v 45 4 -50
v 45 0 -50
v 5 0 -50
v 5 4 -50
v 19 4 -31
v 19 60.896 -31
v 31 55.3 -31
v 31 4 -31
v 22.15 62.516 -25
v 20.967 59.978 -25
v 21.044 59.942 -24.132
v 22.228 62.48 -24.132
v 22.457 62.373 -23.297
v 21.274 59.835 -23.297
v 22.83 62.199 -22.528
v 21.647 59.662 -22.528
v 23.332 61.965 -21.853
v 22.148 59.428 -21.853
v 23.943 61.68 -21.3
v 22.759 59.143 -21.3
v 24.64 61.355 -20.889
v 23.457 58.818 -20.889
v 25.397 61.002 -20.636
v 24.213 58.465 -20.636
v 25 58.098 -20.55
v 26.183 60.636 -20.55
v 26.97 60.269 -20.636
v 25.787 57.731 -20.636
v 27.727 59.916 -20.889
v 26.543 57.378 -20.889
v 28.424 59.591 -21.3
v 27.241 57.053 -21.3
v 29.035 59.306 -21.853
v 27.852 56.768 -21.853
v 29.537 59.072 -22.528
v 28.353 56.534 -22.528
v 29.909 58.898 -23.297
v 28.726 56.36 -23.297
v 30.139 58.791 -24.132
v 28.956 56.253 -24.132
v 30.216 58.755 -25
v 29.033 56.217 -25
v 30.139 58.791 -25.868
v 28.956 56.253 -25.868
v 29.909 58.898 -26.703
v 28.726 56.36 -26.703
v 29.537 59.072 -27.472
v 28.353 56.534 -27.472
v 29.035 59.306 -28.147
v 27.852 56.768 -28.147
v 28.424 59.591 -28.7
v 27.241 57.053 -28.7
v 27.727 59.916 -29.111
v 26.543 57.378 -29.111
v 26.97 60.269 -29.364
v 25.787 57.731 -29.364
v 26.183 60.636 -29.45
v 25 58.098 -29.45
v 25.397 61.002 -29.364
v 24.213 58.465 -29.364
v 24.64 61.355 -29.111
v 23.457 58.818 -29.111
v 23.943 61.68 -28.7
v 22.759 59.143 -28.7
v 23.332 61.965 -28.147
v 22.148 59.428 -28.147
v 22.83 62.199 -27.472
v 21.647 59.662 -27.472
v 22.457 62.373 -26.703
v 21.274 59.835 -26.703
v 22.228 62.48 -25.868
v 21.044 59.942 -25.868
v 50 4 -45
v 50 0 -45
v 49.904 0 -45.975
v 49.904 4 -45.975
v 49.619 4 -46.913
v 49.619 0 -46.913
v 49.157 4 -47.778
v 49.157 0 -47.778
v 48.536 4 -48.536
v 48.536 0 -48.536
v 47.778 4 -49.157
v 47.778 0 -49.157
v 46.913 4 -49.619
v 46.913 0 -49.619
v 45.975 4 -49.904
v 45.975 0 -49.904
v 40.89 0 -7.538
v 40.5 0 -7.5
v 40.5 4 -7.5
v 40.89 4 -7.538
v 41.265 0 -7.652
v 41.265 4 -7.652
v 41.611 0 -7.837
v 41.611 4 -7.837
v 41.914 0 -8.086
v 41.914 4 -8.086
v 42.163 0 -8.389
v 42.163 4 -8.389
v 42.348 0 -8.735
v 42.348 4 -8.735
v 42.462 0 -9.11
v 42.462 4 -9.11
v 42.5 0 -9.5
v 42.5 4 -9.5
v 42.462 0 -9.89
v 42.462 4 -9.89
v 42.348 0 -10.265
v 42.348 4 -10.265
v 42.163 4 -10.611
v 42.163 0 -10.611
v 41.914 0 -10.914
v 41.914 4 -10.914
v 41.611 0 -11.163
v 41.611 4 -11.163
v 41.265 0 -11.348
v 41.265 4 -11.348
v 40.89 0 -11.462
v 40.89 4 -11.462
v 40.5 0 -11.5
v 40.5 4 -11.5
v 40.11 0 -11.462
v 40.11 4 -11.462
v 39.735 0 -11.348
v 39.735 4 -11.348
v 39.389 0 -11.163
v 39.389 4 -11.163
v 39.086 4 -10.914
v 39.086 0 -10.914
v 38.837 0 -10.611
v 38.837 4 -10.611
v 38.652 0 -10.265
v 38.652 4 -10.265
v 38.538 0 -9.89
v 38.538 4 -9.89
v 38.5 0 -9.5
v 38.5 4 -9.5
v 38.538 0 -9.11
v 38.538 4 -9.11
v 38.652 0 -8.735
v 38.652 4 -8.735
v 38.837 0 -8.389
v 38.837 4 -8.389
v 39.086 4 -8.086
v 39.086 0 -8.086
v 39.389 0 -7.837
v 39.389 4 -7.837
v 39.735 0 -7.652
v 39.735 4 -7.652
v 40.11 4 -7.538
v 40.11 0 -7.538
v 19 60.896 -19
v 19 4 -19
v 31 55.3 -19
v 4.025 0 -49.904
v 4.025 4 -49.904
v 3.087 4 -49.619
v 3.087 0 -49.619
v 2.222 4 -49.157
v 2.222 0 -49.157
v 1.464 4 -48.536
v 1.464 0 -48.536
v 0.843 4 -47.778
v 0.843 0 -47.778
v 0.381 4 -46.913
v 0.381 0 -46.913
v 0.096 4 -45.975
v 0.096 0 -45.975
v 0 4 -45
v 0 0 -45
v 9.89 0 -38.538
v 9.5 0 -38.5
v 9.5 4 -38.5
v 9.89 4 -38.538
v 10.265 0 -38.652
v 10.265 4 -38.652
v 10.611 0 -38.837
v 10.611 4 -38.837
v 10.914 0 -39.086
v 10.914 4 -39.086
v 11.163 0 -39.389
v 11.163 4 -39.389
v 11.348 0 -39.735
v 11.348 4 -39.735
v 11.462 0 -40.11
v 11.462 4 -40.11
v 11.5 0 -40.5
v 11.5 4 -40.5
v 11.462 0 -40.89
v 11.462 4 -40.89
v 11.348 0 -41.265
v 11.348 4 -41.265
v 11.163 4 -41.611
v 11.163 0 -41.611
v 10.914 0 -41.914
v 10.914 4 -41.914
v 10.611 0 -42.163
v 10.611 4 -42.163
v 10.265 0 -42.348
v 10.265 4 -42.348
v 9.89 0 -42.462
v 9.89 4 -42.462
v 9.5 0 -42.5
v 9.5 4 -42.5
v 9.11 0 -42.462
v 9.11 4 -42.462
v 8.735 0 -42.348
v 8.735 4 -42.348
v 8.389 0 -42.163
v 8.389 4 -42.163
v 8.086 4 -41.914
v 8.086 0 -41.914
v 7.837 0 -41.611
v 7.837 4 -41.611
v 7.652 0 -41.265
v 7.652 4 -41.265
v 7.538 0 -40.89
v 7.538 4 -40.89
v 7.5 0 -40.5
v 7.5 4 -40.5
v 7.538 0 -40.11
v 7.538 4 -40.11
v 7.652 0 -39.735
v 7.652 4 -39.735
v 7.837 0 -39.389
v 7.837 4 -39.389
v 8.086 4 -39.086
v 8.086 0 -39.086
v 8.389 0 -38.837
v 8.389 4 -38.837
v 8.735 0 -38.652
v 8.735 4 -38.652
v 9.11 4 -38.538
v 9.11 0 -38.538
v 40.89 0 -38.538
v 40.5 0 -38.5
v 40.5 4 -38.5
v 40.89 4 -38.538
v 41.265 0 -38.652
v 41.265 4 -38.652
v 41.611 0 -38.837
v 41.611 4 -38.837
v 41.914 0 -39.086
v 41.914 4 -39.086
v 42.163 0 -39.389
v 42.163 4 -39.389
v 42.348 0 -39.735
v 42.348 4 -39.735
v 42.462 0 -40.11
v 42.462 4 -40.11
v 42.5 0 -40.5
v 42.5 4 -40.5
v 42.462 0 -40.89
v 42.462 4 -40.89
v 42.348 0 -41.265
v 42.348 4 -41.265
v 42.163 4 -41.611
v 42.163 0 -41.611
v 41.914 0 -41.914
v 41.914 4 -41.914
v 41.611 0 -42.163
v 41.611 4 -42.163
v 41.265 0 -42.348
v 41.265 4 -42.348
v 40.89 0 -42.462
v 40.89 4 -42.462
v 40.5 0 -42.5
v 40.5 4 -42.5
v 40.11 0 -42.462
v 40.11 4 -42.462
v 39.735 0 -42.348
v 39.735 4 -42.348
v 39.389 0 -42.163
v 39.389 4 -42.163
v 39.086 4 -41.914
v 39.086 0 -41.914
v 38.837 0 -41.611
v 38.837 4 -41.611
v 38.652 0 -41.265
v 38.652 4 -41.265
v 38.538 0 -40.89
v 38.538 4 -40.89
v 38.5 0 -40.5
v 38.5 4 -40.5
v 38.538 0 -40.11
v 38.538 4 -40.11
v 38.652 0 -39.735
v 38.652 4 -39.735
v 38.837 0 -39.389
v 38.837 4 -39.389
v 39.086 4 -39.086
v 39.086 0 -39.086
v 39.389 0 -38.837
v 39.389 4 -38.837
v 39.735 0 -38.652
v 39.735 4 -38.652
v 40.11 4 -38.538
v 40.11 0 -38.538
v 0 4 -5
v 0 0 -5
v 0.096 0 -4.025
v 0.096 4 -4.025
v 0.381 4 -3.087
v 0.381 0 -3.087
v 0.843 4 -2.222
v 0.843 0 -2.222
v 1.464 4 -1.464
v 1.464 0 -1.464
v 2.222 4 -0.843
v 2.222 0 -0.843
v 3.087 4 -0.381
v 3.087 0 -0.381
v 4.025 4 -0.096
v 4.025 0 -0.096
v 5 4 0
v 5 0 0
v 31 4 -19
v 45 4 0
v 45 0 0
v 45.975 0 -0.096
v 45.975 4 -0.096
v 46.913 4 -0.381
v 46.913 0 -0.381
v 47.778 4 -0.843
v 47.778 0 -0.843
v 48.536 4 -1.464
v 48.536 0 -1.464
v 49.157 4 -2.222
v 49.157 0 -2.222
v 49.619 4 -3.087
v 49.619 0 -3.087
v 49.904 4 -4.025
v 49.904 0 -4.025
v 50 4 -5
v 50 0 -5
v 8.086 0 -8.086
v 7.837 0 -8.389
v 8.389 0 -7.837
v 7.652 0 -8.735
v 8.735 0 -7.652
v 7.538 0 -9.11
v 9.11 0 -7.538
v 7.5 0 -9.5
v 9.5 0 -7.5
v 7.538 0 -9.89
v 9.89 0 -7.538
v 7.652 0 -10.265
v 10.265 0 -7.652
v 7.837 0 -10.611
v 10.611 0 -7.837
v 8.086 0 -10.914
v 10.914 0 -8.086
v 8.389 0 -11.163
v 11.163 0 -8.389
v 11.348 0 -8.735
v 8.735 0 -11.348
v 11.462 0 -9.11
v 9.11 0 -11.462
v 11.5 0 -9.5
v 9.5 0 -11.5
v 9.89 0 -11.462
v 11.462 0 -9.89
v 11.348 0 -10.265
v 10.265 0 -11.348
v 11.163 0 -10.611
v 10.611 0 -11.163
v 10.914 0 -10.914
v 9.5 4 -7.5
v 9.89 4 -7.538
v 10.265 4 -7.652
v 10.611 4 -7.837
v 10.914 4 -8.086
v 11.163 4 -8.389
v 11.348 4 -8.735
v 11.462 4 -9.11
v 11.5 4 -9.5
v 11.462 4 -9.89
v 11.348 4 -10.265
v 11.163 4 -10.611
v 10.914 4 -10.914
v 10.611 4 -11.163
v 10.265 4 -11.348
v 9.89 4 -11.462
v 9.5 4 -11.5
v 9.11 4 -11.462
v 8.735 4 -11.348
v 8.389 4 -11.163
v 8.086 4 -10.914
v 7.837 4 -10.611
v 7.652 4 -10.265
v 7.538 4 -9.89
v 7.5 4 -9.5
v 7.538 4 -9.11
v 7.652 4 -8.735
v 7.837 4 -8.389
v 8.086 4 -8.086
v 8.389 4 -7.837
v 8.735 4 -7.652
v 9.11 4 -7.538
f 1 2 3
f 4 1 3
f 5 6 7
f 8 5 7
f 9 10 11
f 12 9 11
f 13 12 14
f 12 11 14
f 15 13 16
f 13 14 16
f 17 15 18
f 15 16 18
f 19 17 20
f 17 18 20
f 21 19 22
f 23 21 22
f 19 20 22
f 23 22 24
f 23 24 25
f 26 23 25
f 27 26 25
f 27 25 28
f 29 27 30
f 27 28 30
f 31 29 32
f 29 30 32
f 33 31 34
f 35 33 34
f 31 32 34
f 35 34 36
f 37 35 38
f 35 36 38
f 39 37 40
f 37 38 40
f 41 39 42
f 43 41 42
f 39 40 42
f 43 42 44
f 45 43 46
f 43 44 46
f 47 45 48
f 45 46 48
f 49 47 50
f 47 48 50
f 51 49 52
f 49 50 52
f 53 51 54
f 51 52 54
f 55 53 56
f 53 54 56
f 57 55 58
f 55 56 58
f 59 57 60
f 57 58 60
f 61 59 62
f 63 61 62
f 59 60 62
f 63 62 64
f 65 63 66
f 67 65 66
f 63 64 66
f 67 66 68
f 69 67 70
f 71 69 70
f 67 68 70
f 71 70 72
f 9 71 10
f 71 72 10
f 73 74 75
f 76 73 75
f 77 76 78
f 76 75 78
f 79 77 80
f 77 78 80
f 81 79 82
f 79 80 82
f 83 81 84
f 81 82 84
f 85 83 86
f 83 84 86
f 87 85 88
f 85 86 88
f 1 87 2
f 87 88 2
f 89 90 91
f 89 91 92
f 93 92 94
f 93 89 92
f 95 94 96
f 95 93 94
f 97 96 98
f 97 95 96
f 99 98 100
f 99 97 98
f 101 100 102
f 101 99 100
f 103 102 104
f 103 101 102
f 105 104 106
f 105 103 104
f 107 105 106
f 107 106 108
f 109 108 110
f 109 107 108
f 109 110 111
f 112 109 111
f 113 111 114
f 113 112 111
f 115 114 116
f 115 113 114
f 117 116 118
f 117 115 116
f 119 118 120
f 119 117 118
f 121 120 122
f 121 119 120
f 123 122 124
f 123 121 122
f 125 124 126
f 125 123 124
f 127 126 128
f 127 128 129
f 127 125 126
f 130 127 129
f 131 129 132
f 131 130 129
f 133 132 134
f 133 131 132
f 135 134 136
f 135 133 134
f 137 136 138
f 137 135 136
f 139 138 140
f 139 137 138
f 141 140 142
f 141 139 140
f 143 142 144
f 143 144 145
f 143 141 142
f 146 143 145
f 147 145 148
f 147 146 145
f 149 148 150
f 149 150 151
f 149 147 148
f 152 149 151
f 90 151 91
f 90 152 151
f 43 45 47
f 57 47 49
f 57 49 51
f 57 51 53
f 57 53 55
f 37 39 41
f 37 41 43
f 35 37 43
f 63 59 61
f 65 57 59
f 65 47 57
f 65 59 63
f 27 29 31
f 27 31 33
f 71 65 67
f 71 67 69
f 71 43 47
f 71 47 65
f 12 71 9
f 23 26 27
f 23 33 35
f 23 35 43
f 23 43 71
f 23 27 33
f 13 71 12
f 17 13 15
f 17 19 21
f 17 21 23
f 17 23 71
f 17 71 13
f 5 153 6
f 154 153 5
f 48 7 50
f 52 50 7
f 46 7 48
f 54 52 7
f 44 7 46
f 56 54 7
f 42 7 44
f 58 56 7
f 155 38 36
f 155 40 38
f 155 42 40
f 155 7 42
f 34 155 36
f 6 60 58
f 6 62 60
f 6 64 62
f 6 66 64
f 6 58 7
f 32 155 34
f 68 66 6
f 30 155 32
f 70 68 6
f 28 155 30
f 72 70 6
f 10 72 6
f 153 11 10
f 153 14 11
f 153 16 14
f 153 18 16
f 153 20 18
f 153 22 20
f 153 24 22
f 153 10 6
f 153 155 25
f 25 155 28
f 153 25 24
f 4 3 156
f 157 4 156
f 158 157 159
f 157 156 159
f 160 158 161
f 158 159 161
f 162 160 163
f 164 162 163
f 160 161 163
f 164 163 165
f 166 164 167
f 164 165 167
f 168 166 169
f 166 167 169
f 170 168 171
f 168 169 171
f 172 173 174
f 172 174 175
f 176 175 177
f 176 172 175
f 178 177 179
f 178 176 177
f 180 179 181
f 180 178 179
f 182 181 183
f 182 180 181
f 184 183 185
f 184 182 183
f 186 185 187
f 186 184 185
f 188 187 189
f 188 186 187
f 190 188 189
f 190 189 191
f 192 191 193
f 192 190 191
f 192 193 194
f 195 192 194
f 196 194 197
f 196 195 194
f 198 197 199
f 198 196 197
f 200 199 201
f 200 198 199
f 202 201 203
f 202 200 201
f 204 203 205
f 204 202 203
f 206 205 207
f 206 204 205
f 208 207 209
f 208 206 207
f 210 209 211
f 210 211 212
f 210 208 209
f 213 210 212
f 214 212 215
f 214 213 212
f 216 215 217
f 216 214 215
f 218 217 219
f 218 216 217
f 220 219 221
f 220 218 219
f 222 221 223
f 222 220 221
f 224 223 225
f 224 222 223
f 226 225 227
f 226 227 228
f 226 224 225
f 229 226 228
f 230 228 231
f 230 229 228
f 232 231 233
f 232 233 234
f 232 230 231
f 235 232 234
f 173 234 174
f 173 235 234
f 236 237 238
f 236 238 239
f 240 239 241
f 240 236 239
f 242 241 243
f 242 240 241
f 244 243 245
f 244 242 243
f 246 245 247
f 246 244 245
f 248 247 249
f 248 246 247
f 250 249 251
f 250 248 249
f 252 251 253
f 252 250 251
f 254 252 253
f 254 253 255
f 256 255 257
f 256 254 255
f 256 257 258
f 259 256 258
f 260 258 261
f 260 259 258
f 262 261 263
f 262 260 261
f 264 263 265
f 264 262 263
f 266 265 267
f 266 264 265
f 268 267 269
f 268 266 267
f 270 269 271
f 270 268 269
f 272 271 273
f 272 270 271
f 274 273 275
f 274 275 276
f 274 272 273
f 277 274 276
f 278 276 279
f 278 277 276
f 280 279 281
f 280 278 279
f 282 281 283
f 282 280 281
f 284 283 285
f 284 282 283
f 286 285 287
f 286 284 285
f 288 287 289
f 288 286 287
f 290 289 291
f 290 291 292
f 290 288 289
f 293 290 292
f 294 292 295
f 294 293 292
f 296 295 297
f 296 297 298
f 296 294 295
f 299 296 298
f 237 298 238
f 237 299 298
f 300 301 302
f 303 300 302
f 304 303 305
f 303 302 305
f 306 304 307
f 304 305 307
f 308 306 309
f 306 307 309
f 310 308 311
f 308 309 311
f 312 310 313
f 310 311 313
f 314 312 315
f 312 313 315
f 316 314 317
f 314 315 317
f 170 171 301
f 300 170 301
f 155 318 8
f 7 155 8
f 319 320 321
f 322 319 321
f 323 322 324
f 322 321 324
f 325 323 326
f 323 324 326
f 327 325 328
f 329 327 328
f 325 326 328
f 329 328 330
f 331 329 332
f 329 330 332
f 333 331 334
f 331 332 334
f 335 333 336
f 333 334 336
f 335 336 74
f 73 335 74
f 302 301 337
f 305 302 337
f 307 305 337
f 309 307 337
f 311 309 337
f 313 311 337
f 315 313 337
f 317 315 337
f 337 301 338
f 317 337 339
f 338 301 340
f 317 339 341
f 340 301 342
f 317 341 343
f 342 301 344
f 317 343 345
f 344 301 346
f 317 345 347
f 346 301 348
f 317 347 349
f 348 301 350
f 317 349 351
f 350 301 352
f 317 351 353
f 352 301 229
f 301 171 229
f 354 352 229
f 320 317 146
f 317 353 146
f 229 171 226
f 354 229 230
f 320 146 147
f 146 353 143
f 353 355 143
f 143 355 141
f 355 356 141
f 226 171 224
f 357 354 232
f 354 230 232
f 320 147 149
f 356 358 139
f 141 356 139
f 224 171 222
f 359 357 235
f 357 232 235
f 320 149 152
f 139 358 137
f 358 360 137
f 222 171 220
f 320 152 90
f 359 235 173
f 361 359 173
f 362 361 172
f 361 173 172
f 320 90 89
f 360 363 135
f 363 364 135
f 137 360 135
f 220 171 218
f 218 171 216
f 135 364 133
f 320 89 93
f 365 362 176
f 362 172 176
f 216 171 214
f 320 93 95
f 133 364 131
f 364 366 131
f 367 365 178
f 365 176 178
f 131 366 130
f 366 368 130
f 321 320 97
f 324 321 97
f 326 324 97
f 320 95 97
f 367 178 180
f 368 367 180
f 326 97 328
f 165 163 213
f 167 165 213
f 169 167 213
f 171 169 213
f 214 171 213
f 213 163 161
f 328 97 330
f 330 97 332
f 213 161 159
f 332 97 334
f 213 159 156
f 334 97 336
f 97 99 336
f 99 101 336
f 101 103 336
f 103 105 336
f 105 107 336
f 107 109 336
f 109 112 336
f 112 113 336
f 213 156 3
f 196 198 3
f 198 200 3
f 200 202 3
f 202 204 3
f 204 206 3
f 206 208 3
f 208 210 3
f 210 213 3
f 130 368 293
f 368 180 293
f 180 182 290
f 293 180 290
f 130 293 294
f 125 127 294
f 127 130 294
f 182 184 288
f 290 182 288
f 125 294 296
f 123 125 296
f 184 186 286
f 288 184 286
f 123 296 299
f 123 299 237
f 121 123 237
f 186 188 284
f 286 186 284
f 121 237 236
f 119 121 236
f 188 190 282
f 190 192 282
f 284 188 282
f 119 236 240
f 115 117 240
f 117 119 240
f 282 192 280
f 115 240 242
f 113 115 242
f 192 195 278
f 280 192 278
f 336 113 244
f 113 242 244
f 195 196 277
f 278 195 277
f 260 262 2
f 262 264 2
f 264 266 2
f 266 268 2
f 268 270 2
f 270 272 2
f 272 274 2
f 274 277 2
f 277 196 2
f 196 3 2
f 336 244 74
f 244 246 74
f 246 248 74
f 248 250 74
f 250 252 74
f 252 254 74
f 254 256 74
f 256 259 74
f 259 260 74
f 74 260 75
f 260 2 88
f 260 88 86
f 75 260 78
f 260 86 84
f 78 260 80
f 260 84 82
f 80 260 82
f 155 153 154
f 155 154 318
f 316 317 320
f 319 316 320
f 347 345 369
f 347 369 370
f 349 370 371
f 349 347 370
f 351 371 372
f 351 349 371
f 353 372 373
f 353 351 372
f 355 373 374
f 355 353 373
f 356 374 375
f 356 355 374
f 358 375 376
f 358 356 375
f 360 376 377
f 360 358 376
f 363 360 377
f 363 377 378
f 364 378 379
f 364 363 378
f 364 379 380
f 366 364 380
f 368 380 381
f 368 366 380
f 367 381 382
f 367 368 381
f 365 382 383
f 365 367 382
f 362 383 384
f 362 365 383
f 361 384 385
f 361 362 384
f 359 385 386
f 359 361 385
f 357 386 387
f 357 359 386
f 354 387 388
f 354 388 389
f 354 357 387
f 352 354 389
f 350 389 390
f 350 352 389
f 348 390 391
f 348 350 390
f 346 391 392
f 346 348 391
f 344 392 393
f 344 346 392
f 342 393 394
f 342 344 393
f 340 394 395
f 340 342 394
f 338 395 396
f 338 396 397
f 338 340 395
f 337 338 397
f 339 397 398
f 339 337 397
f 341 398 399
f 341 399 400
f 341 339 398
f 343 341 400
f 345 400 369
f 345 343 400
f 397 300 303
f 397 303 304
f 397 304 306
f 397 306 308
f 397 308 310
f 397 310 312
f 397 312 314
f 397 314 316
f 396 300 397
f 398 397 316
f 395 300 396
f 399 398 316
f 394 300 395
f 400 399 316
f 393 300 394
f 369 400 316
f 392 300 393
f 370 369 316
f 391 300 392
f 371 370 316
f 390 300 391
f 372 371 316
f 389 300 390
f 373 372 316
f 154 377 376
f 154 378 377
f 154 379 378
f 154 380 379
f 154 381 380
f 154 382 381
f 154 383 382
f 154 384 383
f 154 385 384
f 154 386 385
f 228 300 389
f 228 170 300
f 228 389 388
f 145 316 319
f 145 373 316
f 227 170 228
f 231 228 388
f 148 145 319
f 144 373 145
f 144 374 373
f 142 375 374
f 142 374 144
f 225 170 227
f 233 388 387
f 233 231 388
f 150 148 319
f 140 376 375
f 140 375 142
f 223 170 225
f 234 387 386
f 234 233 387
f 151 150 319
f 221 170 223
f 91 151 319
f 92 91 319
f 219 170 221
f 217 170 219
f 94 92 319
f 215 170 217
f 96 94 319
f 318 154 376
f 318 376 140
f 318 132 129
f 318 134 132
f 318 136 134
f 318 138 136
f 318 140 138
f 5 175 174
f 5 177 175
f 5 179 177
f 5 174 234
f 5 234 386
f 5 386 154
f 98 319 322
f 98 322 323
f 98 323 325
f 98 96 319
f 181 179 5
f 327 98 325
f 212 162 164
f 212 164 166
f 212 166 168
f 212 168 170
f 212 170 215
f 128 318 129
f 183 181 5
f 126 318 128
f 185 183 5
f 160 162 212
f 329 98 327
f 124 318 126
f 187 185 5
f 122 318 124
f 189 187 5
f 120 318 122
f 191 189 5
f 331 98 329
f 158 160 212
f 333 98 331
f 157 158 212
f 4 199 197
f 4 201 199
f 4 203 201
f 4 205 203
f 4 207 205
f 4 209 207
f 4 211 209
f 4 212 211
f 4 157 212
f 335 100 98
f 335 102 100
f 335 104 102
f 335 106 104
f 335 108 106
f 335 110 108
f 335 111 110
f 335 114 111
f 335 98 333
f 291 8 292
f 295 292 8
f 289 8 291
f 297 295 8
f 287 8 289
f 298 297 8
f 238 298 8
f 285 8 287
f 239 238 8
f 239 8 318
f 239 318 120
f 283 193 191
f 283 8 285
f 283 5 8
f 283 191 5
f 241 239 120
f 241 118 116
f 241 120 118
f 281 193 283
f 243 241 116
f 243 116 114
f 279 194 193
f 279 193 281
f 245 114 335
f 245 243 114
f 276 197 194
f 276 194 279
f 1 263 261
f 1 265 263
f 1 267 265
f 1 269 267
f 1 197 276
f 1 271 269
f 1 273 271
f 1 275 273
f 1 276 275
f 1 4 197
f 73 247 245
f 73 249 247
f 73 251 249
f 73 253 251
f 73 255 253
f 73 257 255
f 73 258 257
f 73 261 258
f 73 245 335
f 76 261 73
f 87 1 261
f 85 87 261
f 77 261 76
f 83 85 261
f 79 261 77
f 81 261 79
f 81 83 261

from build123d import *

# Parameters (mm, degrees)
SKETCH1_R           = 2
BOSS_EXTRUDE1_DEPTH = 4
SKETCH3_W           = 12
SKETCH3_H           = 12
BOSS_EXTRUDE3_DEPTH = 51.3
BOSS_EXTRUDE4_DEPTH = 12
SKETCH6_R           = 4.45
BOSS_EXTRUDE5_DEPTH = 2.8


with BuildPart() as part:
    # Sketch1 → Boss-Extrude1 (new body)
    with BuildSketch(Plane(origin=(0, 0, 0), x_dir=(1, 0, 0), z_dir=(0, 1, 0))):
        with BuildLine():
            Line((5, 0), (45, 0))
            ThreePointArc((45, 0), (48.535533906, 1.464466094), (50, 5))
            Line((50, 5), (50, 45))
            ThreePointArc((50, 45), (48.535533906, 48.535533906), (45, 50))
            Line((45, 50), (5, 50))
            ThreePointArc((5, 50), (1.464466094, 48.535533906), (0, 45))
            Line((0, 45), (0, 5))
            ThreePointArc((0, 5), (1.464466094, 1.464466094), (5, 0))
        make_face()
        with Locations(Location((9.5, 9.5, 0), (0, 0, 270))):
            Circle(SKETCH1_R, mode=Mode.SUBTRACT)
        with Locations(Location((9.5, 40.5, 0), (0, 0, 270))):
            Circle(SKETCH1_R, mode=Mode.SUBTRACT)
        with Locations(Location((40.5, 40.5, 0), (0, 0, 270))):
            Circle(SKETCH1_R, mode=Mode.SUBTRACT)
        with Locations(Location((40.5, 9.5, 0), (0, 0, 270))):
            Circle(SKETCH1_R, mode=Mode.SUBTRACT)
    extrude(amount=BOSS_EXTRUDE1_DEPTH)

    # Sketch3 → Boss-Extrude3 (add)
    with BuildSketch(Plane(origin=(0, 4, 0), x_dir=(1, 0, 0), z_dir=(0, 1, 0))):
        with Locations((25, 25)):
            Rectangle(SKETCH3_W, SKETCH3_H)
    extrude(amount=BOSS_EXTRUDE3_DEPTH)

    # Sketch5 → Boss-Extrude4 (add)
    with BuildSketch(Plane.XY.offset(-19)):
        Polygon((31, 55.3), (19, 60.895691898), (19, 55.3), align=None)
    extrude(amount=-BOSS_EXTRUDE4_DEPTH)

    # Sketch6 → Boss-Extrude5 (add)
    with BuildSketch(Plane(origin=(26.717920902, 57.296766276, 0), x_dir=(0.9063077870366527, -0.4226182617406934, 0), z_dir=(0.42261826174069345, 0.9063077870366528, 0))):
        with Locations(Location((-1.89551599, 25, 0), (0, 0, 180))):
            Circle(SKETCH6_R)
    extrude(amount=BOSS_EXTRUDE5_DEPTH)


solid = part.part
